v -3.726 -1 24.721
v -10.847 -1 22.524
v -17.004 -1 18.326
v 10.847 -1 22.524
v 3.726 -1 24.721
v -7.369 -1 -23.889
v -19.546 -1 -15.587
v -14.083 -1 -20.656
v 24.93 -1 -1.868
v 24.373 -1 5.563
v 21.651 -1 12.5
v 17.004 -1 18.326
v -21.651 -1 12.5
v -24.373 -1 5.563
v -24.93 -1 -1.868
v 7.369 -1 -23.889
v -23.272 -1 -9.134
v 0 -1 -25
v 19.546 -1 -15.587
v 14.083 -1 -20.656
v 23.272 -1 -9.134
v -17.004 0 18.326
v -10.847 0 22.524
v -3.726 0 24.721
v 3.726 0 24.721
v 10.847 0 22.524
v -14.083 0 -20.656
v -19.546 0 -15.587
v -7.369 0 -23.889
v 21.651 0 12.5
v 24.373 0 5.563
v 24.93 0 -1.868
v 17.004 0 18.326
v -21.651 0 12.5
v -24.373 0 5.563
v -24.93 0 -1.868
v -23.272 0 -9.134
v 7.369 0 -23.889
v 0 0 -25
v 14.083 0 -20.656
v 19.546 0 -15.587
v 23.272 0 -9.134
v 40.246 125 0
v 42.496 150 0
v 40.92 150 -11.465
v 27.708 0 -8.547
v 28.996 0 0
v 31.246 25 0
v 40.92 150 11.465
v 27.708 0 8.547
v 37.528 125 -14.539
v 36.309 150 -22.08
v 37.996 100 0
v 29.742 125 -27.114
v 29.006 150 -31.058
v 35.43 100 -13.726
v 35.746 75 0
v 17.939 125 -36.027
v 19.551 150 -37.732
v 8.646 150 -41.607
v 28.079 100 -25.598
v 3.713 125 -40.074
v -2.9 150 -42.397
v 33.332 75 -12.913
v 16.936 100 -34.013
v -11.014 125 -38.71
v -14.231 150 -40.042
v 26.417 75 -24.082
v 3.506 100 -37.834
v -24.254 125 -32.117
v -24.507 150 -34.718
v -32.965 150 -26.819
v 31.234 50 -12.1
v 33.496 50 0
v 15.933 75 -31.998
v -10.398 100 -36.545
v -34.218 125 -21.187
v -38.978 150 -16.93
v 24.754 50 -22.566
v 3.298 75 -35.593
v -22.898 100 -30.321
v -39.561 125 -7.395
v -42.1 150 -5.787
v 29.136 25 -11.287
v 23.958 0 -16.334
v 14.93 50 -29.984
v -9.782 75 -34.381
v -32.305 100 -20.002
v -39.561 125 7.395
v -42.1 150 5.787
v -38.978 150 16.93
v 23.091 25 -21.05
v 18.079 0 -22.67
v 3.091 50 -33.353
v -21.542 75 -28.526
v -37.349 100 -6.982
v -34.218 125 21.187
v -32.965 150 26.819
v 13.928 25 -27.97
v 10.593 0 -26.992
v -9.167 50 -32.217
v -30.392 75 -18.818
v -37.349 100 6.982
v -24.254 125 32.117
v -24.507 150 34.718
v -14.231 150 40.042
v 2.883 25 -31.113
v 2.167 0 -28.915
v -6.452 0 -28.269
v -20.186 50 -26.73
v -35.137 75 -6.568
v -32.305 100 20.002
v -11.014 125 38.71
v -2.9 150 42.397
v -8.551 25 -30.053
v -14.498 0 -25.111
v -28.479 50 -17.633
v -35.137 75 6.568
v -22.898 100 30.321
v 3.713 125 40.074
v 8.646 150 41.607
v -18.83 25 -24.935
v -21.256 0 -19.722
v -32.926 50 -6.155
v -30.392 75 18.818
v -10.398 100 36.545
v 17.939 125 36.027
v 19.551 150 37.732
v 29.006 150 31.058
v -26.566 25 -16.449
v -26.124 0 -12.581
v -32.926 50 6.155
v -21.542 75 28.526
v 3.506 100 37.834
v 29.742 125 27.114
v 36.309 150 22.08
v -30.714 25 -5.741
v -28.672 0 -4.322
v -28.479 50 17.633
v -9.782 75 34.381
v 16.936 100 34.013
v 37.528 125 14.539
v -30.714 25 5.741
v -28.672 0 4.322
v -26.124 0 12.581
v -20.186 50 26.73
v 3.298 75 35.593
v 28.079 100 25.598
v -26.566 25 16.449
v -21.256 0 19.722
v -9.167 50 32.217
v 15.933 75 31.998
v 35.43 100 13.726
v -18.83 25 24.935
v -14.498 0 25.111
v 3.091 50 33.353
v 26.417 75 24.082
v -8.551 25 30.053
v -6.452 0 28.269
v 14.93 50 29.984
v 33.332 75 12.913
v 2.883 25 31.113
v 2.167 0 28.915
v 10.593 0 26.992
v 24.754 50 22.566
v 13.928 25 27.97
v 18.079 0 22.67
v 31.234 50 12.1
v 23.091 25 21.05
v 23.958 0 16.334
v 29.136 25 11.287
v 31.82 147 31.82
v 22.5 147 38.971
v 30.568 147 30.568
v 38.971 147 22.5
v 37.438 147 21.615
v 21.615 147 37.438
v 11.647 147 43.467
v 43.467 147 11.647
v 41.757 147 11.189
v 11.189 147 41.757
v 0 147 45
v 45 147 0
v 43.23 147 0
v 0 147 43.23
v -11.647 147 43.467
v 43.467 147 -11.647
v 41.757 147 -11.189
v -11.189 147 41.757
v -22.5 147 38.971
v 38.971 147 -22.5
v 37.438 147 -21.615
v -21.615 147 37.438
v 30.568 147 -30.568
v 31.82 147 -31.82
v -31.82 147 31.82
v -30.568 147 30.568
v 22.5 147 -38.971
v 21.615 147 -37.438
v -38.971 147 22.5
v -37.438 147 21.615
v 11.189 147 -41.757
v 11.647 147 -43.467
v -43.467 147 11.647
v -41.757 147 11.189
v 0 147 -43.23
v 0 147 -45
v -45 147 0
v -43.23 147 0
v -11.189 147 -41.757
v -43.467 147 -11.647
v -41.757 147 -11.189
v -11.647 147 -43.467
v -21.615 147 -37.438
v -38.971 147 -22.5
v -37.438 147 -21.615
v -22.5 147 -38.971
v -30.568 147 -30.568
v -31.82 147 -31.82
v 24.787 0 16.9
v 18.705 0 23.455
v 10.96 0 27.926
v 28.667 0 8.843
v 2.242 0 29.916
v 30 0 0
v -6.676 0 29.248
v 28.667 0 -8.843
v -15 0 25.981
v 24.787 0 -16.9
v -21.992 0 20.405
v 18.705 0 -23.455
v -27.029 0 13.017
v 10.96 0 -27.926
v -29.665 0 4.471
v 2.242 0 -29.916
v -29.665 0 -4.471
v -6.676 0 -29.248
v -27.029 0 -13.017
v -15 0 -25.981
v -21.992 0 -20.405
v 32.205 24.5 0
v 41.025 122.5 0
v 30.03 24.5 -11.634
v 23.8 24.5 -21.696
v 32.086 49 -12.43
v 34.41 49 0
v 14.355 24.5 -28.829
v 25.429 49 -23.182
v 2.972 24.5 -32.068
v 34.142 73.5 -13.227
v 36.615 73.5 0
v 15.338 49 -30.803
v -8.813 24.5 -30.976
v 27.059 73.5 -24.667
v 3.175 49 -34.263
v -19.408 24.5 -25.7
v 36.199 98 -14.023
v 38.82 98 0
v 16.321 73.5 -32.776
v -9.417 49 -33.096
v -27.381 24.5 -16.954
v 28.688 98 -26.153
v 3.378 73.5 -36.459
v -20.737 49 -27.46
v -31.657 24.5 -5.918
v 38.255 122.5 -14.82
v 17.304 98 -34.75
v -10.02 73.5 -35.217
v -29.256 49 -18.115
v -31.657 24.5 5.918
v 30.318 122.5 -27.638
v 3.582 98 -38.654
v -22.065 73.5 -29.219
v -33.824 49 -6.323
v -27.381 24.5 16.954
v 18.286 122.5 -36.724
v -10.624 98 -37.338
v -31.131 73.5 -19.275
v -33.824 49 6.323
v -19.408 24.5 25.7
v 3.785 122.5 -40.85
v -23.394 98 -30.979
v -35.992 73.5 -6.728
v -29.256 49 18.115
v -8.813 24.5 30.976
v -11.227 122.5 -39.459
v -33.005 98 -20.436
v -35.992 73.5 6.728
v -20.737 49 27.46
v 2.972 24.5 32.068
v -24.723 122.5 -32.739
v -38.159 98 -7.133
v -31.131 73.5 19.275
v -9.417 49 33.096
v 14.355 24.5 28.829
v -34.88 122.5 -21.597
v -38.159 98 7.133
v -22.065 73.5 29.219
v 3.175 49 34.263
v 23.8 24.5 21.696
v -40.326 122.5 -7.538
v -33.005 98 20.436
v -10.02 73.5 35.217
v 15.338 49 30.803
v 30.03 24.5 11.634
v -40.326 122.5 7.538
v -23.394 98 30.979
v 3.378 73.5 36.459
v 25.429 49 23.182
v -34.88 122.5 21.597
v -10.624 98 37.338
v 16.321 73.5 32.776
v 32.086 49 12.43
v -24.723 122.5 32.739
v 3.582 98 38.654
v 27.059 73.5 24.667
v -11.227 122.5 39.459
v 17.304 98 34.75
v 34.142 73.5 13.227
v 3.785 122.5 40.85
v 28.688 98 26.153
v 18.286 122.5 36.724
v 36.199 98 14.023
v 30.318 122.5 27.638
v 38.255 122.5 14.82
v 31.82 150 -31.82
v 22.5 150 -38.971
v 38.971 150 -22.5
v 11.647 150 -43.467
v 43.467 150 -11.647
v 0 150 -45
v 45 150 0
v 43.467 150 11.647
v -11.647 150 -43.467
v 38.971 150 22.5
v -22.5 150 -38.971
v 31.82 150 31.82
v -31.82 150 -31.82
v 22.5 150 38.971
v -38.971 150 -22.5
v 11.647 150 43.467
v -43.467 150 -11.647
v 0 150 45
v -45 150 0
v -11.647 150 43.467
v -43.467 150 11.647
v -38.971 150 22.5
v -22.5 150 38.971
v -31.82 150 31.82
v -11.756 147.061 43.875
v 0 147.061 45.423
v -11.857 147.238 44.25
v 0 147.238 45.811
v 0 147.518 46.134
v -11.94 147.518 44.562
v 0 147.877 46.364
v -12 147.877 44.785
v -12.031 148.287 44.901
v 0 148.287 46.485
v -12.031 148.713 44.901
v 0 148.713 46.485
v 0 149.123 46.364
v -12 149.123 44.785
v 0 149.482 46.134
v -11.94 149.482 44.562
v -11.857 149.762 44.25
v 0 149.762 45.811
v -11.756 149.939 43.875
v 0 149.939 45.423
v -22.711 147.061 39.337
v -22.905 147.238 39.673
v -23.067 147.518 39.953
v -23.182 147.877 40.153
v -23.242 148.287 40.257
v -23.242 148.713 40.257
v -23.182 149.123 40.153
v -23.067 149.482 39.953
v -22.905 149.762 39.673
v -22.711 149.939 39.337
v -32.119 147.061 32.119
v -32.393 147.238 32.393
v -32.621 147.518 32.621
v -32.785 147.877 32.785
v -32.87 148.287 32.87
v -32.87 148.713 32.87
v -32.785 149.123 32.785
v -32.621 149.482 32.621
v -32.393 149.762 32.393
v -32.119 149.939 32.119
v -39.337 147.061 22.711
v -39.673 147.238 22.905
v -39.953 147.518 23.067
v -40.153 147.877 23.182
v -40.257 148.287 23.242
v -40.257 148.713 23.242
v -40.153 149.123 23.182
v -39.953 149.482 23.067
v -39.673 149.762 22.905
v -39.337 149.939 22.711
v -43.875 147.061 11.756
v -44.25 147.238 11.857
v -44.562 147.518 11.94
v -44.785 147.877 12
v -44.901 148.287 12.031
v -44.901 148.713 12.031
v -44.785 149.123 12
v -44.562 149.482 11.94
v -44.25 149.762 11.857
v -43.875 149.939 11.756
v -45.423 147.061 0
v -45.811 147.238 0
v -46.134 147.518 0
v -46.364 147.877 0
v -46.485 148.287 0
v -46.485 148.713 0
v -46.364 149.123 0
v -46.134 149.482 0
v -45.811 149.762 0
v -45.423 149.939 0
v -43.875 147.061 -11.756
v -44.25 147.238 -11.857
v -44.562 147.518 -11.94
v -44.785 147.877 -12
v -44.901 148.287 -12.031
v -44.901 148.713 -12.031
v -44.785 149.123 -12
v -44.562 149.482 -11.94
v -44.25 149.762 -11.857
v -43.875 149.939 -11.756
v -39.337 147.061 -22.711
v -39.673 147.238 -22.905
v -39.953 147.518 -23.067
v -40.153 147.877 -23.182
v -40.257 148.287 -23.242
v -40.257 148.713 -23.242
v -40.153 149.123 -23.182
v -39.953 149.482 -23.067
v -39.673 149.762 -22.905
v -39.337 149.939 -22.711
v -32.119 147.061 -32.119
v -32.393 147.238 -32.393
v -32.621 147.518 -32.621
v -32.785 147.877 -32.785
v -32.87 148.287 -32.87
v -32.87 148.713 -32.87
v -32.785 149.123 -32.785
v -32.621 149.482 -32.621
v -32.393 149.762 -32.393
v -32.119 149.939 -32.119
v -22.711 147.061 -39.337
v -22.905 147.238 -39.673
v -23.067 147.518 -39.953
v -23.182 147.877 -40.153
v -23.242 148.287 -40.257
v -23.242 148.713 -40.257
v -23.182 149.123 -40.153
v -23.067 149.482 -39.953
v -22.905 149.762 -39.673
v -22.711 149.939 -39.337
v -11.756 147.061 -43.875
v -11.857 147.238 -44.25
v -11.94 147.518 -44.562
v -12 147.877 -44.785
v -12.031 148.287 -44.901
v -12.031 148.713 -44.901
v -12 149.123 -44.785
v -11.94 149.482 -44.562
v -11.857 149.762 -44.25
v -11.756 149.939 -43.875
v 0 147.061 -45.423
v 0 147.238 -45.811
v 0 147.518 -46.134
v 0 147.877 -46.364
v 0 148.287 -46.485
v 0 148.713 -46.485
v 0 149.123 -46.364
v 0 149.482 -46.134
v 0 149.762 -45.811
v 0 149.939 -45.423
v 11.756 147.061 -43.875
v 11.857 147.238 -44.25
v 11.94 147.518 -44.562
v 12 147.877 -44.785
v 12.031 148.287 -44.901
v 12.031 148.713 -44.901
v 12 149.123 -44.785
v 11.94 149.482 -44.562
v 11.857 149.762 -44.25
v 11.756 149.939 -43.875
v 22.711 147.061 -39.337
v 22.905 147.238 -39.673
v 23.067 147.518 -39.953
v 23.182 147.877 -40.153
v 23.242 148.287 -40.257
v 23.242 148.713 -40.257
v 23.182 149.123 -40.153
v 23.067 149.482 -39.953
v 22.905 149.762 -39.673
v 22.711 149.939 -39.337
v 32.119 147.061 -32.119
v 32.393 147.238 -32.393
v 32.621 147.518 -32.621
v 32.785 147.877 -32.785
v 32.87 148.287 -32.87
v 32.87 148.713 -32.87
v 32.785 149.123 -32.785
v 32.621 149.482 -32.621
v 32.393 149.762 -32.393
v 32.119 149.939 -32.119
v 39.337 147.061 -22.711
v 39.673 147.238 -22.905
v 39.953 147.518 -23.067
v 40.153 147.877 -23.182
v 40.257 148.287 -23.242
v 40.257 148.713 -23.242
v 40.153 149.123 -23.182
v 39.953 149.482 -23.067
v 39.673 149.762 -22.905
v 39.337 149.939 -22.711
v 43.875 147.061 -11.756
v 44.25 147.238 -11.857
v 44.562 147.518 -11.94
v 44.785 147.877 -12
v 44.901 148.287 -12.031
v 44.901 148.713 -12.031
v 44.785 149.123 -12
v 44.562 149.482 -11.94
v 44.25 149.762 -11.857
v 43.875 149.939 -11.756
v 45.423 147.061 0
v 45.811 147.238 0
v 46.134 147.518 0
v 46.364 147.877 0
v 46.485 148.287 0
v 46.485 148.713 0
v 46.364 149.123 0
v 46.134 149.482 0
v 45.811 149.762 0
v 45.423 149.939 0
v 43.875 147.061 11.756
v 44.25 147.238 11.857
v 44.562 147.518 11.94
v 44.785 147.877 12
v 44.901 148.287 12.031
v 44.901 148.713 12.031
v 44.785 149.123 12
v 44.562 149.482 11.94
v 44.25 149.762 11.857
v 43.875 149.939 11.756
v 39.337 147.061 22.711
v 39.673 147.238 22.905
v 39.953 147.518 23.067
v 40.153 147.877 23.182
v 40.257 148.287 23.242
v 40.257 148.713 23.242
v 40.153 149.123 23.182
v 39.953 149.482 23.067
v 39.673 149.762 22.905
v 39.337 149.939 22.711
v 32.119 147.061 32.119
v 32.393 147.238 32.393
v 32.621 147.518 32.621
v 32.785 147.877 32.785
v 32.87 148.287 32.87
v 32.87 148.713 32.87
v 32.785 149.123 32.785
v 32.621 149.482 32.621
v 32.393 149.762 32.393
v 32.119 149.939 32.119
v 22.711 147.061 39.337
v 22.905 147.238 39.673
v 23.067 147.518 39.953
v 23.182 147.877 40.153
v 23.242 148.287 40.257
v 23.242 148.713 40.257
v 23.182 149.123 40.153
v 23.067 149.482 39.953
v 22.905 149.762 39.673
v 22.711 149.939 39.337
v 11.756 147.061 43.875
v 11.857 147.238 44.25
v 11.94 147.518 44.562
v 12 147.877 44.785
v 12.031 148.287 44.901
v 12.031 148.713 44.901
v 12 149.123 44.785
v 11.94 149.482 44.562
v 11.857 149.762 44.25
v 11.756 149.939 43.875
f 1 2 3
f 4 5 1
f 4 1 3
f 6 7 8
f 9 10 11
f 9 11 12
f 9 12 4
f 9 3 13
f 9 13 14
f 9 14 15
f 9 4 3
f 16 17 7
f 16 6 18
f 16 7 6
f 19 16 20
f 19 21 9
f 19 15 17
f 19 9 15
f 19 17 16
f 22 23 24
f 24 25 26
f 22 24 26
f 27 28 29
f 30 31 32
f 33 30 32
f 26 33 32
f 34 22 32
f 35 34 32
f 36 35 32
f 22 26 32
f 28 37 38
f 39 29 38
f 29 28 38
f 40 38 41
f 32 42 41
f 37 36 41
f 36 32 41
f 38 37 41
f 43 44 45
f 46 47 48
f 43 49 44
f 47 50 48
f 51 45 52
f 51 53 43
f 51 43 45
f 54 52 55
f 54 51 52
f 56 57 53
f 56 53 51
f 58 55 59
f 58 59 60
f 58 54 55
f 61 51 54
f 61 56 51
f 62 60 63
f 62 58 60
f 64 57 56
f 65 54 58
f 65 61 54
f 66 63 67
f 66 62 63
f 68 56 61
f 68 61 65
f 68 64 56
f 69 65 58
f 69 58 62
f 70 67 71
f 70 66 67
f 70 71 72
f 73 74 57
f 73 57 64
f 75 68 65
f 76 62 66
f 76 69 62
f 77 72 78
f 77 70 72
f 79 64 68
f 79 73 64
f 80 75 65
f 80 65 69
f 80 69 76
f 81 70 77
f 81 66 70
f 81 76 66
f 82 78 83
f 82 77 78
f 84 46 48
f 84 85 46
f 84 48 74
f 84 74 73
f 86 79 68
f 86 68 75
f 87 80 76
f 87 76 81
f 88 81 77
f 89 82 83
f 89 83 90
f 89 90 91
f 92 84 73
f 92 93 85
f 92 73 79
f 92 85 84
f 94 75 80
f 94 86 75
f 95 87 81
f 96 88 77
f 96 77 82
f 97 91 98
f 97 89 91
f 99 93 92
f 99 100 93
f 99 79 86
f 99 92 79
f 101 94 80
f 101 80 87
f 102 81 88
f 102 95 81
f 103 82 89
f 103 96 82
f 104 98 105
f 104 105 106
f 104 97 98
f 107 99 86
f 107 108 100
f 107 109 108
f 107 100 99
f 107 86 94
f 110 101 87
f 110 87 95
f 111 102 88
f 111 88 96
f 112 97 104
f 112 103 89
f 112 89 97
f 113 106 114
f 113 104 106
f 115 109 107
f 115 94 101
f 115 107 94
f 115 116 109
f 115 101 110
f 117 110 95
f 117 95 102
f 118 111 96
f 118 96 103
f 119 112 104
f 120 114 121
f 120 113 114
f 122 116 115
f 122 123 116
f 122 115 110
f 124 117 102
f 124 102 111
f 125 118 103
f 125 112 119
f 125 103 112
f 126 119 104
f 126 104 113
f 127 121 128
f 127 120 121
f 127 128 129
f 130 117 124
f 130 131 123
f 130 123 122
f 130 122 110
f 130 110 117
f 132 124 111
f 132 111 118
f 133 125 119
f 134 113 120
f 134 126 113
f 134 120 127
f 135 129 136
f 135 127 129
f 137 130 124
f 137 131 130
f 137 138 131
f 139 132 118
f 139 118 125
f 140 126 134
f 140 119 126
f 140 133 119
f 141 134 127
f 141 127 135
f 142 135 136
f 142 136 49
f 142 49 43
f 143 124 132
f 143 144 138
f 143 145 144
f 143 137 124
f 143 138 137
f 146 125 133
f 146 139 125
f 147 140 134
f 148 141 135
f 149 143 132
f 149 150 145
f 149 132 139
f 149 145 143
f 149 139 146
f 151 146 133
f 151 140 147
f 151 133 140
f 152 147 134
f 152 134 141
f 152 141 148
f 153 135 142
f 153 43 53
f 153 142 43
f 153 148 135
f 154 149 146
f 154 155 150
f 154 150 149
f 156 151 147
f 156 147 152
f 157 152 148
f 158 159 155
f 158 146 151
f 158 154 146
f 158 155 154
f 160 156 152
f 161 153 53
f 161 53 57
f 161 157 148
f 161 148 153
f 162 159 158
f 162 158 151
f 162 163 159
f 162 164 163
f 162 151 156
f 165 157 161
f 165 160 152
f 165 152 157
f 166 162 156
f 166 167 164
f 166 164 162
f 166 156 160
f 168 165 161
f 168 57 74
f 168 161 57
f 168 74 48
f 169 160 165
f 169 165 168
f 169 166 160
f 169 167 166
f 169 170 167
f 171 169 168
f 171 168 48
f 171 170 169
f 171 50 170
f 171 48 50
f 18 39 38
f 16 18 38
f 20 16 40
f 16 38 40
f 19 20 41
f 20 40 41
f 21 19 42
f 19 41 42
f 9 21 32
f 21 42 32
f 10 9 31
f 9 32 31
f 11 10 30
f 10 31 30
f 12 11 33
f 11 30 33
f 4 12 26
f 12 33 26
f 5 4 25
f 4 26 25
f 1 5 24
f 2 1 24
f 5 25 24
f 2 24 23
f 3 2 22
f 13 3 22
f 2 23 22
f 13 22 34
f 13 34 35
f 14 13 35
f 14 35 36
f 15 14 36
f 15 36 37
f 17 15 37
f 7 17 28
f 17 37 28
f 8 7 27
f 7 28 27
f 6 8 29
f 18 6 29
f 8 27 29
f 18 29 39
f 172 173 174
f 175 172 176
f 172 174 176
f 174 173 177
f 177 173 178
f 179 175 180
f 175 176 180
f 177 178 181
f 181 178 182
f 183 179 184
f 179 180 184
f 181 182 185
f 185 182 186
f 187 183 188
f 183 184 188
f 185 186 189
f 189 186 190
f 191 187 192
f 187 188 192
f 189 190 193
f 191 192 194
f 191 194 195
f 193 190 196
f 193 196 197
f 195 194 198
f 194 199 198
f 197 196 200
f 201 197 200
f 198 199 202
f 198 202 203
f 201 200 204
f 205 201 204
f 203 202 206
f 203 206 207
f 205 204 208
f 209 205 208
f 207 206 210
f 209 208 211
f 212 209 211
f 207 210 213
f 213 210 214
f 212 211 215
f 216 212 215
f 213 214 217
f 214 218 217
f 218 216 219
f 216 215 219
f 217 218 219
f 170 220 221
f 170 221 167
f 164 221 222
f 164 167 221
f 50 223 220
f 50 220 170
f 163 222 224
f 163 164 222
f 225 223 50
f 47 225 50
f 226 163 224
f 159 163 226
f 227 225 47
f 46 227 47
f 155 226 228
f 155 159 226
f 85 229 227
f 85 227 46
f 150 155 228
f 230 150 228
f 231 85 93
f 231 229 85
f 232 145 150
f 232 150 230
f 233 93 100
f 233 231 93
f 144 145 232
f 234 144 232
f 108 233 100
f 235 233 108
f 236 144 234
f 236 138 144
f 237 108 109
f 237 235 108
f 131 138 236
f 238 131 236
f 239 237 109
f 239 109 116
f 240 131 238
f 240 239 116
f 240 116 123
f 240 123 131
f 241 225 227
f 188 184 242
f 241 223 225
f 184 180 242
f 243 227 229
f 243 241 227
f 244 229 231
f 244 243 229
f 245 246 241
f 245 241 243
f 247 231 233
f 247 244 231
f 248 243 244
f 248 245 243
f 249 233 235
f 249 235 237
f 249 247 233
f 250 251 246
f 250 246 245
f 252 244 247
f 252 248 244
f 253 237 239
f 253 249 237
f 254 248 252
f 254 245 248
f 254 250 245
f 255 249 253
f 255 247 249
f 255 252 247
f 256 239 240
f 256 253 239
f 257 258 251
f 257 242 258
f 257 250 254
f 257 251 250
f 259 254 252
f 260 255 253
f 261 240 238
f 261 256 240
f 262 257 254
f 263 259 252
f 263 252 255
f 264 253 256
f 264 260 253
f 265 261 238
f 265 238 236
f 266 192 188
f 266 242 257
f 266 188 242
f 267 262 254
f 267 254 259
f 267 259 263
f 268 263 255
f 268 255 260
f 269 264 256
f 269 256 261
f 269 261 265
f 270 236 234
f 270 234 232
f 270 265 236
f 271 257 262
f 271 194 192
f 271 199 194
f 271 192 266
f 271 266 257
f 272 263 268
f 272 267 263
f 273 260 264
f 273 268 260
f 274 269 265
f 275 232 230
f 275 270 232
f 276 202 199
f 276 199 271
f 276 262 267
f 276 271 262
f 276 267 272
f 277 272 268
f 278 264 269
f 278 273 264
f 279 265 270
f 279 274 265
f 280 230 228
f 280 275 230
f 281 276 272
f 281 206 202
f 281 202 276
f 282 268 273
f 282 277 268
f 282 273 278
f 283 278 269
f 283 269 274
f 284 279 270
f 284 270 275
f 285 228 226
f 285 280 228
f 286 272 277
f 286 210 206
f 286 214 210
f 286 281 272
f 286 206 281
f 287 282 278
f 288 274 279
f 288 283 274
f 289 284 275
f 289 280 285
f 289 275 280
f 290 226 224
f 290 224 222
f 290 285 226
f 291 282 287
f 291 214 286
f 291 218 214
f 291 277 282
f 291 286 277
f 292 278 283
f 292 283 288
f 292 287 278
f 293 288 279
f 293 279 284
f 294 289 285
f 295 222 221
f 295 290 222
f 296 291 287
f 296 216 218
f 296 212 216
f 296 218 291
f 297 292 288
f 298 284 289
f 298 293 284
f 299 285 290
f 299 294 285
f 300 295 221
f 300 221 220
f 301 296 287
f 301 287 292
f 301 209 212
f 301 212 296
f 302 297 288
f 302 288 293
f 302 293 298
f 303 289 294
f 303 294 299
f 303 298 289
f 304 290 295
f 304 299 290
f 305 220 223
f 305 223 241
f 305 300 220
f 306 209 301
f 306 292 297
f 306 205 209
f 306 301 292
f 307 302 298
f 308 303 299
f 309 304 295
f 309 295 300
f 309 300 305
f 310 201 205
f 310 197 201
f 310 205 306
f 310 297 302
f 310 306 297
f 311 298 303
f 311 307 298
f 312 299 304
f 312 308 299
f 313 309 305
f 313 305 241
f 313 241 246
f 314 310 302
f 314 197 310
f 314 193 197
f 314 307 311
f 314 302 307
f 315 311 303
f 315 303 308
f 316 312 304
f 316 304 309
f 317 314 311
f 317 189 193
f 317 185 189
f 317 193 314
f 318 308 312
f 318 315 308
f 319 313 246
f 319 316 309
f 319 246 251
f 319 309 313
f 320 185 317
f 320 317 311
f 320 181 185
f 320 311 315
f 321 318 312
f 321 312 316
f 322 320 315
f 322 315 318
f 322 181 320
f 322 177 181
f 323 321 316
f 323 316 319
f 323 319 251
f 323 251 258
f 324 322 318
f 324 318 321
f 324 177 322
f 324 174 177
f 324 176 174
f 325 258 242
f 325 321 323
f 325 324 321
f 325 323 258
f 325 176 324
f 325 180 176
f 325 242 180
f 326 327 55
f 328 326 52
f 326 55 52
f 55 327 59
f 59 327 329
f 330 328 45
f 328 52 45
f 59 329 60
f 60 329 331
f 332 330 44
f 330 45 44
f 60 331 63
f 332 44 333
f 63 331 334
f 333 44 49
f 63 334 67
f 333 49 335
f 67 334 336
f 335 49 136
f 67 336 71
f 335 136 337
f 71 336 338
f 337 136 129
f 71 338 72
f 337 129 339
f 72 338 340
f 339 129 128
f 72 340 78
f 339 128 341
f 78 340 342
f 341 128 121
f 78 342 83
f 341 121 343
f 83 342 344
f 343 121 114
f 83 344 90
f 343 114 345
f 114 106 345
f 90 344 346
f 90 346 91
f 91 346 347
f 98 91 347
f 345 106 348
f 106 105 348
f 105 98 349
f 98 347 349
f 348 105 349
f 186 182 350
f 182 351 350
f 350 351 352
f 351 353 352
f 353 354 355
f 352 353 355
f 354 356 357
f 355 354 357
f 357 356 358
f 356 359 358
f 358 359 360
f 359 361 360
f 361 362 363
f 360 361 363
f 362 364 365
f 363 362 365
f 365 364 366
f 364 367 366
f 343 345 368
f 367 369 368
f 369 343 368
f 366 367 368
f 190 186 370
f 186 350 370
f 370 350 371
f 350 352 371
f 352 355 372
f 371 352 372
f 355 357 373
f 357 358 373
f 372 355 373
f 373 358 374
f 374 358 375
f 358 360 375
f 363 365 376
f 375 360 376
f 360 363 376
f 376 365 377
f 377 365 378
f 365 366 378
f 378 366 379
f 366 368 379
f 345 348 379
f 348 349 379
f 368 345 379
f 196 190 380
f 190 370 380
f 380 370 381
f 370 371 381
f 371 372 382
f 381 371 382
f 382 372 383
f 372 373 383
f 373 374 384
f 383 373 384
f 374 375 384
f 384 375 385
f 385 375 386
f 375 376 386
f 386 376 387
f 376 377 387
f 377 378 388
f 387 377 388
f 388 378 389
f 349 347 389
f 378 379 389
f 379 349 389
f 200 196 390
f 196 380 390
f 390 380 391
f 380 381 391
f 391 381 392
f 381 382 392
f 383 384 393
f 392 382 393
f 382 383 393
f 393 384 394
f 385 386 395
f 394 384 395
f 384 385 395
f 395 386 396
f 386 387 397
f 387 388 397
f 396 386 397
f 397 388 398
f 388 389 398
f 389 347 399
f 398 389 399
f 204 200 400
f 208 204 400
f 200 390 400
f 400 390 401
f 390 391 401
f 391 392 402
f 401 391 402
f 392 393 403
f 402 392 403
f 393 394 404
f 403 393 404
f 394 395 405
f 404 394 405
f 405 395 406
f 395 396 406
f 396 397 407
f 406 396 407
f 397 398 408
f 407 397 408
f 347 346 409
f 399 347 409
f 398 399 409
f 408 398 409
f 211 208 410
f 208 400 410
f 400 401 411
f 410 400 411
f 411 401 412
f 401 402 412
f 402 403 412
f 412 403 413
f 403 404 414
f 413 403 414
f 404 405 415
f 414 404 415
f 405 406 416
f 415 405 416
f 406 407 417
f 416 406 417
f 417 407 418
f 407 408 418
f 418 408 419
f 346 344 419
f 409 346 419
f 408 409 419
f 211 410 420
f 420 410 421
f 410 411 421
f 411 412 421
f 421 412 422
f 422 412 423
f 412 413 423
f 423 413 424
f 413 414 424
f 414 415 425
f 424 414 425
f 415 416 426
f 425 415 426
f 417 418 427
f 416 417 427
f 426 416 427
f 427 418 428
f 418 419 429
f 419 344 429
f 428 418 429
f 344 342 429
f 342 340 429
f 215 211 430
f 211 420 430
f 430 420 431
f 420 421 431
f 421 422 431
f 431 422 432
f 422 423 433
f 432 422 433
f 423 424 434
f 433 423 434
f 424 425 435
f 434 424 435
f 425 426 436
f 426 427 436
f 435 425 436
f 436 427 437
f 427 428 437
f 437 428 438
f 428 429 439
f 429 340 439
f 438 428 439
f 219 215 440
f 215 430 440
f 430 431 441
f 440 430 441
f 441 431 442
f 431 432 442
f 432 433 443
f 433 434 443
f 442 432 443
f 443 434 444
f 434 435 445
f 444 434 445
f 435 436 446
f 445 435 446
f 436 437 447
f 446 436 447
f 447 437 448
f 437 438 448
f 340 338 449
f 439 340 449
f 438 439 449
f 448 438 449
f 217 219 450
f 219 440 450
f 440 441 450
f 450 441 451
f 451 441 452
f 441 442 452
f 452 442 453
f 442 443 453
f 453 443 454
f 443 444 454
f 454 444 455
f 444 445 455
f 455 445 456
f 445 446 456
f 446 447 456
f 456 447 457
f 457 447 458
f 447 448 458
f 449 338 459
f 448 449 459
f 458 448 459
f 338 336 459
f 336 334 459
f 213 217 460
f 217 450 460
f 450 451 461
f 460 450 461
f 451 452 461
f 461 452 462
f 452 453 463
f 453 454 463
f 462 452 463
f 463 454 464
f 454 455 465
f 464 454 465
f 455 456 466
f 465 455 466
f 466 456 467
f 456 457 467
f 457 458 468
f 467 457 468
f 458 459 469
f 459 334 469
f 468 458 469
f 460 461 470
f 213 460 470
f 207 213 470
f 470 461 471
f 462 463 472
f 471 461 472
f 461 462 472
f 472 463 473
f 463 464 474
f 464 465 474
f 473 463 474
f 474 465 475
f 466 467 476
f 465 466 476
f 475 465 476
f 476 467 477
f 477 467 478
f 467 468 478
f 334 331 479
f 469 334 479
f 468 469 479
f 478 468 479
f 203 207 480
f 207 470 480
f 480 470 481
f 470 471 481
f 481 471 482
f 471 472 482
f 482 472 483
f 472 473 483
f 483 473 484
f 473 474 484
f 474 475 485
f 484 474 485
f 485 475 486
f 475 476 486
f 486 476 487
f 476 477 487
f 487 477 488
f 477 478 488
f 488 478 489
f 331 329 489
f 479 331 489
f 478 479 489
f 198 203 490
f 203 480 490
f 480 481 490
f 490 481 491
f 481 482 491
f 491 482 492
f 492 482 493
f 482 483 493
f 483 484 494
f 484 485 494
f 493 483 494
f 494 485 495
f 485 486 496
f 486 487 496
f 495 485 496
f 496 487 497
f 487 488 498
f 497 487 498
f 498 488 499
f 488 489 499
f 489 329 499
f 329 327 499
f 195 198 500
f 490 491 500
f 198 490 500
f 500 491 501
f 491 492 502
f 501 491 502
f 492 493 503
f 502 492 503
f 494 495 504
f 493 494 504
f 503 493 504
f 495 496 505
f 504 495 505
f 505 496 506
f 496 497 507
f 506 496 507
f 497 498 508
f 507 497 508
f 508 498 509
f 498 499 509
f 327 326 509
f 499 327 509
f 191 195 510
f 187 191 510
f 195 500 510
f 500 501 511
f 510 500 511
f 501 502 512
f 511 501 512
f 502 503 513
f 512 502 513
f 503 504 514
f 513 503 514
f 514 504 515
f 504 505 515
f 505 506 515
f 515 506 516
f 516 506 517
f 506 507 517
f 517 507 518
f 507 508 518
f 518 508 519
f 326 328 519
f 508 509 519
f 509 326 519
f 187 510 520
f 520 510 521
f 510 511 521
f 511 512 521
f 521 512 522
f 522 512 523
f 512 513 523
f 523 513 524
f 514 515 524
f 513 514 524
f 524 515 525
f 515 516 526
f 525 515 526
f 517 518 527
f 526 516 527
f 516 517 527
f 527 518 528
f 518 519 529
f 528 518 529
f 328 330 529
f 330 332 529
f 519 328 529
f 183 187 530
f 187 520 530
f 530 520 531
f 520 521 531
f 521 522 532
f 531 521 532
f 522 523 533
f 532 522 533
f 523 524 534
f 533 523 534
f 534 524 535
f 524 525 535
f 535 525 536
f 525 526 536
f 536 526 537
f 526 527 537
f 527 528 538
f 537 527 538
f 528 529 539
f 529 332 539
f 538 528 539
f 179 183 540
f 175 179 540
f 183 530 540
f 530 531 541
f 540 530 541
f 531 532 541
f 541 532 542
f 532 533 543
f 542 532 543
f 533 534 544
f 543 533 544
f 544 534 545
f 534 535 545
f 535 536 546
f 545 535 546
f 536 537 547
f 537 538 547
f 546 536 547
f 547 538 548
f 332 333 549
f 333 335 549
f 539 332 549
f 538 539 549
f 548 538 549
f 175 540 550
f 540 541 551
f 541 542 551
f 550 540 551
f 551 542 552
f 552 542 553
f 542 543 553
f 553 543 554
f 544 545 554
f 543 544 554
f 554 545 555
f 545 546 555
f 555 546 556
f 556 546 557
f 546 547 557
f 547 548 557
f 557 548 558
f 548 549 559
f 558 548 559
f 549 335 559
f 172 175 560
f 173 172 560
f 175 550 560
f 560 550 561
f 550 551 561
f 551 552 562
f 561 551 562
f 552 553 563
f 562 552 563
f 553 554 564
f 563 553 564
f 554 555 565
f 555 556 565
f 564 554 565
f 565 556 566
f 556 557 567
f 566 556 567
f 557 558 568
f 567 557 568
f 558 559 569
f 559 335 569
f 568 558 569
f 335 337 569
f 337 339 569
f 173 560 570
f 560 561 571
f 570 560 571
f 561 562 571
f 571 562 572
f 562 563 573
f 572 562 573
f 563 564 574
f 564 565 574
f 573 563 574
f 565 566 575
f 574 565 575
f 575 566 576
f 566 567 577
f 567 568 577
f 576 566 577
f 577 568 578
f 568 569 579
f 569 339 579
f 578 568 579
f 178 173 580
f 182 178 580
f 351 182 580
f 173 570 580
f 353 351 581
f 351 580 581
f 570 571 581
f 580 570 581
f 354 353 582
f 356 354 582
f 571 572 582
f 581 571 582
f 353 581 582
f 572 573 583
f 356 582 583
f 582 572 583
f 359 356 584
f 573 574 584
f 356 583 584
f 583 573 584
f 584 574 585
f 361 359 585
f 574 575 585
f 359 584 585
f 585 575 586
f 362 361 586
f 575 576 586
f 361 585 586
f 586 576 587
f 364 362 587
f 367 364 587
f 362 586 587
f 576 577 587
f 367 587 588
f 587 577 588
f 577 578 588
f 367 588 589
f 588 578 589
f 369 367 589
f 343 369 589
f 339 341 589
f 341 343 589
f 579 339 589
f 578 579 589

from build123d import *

# Parameters (mm, degrees)
SKETCH5_R           = 25
BOSS_EXTRUDE1_DEPTH = 1


# Read off the part's stored shape, not the designer's step: Loft-Thin1
with BuildPart() as part:
    # Loft-Thin1 outline → Loft-Thin1 (revolve)
    with BuildSketch(Plane.XY):
        Polygon((42.495958168, 150), (28.995958168, 0), (30, 0), (43.5, 150), align=None)
    revolve(axis=Axis((0, 0, 0), (0, 1, 0)))

    # Sketch6 → Revolve1 (revolve)
    with BuildSketch(Plane.XY, mode=Mode.PRIVATE) as revolve1_sk:
        with BuildLine():
            Line((43.5, 150), (43.23, 147))
            Line((43.23, 147), (45, 147))
            ThreePointArc((45, 147), (46.5, 148.5), (45, 150))
            Line((45, 150), (43.5, 150))
        make_face()
    revolve(revolve1_sk.sketch.rotate(Axis((0, 150, 0), (0, -1, 0)), 90), axis=Axis((0, 150, 0), (0, -1, 0)))


with BuildPart() as body_2:
    # Sketch5 → Boss-Extrude1 (new body)
    with BuildSketch(Plane.XZ):
        with Locations(Location((0, 0, 0), (0, 0, 270))):
            Circle(SKETCH5_R)
    extrude(amount=BOSS_EXTRUDE1_DEPTH)


solid = Compound([part.part, body_2.part])
